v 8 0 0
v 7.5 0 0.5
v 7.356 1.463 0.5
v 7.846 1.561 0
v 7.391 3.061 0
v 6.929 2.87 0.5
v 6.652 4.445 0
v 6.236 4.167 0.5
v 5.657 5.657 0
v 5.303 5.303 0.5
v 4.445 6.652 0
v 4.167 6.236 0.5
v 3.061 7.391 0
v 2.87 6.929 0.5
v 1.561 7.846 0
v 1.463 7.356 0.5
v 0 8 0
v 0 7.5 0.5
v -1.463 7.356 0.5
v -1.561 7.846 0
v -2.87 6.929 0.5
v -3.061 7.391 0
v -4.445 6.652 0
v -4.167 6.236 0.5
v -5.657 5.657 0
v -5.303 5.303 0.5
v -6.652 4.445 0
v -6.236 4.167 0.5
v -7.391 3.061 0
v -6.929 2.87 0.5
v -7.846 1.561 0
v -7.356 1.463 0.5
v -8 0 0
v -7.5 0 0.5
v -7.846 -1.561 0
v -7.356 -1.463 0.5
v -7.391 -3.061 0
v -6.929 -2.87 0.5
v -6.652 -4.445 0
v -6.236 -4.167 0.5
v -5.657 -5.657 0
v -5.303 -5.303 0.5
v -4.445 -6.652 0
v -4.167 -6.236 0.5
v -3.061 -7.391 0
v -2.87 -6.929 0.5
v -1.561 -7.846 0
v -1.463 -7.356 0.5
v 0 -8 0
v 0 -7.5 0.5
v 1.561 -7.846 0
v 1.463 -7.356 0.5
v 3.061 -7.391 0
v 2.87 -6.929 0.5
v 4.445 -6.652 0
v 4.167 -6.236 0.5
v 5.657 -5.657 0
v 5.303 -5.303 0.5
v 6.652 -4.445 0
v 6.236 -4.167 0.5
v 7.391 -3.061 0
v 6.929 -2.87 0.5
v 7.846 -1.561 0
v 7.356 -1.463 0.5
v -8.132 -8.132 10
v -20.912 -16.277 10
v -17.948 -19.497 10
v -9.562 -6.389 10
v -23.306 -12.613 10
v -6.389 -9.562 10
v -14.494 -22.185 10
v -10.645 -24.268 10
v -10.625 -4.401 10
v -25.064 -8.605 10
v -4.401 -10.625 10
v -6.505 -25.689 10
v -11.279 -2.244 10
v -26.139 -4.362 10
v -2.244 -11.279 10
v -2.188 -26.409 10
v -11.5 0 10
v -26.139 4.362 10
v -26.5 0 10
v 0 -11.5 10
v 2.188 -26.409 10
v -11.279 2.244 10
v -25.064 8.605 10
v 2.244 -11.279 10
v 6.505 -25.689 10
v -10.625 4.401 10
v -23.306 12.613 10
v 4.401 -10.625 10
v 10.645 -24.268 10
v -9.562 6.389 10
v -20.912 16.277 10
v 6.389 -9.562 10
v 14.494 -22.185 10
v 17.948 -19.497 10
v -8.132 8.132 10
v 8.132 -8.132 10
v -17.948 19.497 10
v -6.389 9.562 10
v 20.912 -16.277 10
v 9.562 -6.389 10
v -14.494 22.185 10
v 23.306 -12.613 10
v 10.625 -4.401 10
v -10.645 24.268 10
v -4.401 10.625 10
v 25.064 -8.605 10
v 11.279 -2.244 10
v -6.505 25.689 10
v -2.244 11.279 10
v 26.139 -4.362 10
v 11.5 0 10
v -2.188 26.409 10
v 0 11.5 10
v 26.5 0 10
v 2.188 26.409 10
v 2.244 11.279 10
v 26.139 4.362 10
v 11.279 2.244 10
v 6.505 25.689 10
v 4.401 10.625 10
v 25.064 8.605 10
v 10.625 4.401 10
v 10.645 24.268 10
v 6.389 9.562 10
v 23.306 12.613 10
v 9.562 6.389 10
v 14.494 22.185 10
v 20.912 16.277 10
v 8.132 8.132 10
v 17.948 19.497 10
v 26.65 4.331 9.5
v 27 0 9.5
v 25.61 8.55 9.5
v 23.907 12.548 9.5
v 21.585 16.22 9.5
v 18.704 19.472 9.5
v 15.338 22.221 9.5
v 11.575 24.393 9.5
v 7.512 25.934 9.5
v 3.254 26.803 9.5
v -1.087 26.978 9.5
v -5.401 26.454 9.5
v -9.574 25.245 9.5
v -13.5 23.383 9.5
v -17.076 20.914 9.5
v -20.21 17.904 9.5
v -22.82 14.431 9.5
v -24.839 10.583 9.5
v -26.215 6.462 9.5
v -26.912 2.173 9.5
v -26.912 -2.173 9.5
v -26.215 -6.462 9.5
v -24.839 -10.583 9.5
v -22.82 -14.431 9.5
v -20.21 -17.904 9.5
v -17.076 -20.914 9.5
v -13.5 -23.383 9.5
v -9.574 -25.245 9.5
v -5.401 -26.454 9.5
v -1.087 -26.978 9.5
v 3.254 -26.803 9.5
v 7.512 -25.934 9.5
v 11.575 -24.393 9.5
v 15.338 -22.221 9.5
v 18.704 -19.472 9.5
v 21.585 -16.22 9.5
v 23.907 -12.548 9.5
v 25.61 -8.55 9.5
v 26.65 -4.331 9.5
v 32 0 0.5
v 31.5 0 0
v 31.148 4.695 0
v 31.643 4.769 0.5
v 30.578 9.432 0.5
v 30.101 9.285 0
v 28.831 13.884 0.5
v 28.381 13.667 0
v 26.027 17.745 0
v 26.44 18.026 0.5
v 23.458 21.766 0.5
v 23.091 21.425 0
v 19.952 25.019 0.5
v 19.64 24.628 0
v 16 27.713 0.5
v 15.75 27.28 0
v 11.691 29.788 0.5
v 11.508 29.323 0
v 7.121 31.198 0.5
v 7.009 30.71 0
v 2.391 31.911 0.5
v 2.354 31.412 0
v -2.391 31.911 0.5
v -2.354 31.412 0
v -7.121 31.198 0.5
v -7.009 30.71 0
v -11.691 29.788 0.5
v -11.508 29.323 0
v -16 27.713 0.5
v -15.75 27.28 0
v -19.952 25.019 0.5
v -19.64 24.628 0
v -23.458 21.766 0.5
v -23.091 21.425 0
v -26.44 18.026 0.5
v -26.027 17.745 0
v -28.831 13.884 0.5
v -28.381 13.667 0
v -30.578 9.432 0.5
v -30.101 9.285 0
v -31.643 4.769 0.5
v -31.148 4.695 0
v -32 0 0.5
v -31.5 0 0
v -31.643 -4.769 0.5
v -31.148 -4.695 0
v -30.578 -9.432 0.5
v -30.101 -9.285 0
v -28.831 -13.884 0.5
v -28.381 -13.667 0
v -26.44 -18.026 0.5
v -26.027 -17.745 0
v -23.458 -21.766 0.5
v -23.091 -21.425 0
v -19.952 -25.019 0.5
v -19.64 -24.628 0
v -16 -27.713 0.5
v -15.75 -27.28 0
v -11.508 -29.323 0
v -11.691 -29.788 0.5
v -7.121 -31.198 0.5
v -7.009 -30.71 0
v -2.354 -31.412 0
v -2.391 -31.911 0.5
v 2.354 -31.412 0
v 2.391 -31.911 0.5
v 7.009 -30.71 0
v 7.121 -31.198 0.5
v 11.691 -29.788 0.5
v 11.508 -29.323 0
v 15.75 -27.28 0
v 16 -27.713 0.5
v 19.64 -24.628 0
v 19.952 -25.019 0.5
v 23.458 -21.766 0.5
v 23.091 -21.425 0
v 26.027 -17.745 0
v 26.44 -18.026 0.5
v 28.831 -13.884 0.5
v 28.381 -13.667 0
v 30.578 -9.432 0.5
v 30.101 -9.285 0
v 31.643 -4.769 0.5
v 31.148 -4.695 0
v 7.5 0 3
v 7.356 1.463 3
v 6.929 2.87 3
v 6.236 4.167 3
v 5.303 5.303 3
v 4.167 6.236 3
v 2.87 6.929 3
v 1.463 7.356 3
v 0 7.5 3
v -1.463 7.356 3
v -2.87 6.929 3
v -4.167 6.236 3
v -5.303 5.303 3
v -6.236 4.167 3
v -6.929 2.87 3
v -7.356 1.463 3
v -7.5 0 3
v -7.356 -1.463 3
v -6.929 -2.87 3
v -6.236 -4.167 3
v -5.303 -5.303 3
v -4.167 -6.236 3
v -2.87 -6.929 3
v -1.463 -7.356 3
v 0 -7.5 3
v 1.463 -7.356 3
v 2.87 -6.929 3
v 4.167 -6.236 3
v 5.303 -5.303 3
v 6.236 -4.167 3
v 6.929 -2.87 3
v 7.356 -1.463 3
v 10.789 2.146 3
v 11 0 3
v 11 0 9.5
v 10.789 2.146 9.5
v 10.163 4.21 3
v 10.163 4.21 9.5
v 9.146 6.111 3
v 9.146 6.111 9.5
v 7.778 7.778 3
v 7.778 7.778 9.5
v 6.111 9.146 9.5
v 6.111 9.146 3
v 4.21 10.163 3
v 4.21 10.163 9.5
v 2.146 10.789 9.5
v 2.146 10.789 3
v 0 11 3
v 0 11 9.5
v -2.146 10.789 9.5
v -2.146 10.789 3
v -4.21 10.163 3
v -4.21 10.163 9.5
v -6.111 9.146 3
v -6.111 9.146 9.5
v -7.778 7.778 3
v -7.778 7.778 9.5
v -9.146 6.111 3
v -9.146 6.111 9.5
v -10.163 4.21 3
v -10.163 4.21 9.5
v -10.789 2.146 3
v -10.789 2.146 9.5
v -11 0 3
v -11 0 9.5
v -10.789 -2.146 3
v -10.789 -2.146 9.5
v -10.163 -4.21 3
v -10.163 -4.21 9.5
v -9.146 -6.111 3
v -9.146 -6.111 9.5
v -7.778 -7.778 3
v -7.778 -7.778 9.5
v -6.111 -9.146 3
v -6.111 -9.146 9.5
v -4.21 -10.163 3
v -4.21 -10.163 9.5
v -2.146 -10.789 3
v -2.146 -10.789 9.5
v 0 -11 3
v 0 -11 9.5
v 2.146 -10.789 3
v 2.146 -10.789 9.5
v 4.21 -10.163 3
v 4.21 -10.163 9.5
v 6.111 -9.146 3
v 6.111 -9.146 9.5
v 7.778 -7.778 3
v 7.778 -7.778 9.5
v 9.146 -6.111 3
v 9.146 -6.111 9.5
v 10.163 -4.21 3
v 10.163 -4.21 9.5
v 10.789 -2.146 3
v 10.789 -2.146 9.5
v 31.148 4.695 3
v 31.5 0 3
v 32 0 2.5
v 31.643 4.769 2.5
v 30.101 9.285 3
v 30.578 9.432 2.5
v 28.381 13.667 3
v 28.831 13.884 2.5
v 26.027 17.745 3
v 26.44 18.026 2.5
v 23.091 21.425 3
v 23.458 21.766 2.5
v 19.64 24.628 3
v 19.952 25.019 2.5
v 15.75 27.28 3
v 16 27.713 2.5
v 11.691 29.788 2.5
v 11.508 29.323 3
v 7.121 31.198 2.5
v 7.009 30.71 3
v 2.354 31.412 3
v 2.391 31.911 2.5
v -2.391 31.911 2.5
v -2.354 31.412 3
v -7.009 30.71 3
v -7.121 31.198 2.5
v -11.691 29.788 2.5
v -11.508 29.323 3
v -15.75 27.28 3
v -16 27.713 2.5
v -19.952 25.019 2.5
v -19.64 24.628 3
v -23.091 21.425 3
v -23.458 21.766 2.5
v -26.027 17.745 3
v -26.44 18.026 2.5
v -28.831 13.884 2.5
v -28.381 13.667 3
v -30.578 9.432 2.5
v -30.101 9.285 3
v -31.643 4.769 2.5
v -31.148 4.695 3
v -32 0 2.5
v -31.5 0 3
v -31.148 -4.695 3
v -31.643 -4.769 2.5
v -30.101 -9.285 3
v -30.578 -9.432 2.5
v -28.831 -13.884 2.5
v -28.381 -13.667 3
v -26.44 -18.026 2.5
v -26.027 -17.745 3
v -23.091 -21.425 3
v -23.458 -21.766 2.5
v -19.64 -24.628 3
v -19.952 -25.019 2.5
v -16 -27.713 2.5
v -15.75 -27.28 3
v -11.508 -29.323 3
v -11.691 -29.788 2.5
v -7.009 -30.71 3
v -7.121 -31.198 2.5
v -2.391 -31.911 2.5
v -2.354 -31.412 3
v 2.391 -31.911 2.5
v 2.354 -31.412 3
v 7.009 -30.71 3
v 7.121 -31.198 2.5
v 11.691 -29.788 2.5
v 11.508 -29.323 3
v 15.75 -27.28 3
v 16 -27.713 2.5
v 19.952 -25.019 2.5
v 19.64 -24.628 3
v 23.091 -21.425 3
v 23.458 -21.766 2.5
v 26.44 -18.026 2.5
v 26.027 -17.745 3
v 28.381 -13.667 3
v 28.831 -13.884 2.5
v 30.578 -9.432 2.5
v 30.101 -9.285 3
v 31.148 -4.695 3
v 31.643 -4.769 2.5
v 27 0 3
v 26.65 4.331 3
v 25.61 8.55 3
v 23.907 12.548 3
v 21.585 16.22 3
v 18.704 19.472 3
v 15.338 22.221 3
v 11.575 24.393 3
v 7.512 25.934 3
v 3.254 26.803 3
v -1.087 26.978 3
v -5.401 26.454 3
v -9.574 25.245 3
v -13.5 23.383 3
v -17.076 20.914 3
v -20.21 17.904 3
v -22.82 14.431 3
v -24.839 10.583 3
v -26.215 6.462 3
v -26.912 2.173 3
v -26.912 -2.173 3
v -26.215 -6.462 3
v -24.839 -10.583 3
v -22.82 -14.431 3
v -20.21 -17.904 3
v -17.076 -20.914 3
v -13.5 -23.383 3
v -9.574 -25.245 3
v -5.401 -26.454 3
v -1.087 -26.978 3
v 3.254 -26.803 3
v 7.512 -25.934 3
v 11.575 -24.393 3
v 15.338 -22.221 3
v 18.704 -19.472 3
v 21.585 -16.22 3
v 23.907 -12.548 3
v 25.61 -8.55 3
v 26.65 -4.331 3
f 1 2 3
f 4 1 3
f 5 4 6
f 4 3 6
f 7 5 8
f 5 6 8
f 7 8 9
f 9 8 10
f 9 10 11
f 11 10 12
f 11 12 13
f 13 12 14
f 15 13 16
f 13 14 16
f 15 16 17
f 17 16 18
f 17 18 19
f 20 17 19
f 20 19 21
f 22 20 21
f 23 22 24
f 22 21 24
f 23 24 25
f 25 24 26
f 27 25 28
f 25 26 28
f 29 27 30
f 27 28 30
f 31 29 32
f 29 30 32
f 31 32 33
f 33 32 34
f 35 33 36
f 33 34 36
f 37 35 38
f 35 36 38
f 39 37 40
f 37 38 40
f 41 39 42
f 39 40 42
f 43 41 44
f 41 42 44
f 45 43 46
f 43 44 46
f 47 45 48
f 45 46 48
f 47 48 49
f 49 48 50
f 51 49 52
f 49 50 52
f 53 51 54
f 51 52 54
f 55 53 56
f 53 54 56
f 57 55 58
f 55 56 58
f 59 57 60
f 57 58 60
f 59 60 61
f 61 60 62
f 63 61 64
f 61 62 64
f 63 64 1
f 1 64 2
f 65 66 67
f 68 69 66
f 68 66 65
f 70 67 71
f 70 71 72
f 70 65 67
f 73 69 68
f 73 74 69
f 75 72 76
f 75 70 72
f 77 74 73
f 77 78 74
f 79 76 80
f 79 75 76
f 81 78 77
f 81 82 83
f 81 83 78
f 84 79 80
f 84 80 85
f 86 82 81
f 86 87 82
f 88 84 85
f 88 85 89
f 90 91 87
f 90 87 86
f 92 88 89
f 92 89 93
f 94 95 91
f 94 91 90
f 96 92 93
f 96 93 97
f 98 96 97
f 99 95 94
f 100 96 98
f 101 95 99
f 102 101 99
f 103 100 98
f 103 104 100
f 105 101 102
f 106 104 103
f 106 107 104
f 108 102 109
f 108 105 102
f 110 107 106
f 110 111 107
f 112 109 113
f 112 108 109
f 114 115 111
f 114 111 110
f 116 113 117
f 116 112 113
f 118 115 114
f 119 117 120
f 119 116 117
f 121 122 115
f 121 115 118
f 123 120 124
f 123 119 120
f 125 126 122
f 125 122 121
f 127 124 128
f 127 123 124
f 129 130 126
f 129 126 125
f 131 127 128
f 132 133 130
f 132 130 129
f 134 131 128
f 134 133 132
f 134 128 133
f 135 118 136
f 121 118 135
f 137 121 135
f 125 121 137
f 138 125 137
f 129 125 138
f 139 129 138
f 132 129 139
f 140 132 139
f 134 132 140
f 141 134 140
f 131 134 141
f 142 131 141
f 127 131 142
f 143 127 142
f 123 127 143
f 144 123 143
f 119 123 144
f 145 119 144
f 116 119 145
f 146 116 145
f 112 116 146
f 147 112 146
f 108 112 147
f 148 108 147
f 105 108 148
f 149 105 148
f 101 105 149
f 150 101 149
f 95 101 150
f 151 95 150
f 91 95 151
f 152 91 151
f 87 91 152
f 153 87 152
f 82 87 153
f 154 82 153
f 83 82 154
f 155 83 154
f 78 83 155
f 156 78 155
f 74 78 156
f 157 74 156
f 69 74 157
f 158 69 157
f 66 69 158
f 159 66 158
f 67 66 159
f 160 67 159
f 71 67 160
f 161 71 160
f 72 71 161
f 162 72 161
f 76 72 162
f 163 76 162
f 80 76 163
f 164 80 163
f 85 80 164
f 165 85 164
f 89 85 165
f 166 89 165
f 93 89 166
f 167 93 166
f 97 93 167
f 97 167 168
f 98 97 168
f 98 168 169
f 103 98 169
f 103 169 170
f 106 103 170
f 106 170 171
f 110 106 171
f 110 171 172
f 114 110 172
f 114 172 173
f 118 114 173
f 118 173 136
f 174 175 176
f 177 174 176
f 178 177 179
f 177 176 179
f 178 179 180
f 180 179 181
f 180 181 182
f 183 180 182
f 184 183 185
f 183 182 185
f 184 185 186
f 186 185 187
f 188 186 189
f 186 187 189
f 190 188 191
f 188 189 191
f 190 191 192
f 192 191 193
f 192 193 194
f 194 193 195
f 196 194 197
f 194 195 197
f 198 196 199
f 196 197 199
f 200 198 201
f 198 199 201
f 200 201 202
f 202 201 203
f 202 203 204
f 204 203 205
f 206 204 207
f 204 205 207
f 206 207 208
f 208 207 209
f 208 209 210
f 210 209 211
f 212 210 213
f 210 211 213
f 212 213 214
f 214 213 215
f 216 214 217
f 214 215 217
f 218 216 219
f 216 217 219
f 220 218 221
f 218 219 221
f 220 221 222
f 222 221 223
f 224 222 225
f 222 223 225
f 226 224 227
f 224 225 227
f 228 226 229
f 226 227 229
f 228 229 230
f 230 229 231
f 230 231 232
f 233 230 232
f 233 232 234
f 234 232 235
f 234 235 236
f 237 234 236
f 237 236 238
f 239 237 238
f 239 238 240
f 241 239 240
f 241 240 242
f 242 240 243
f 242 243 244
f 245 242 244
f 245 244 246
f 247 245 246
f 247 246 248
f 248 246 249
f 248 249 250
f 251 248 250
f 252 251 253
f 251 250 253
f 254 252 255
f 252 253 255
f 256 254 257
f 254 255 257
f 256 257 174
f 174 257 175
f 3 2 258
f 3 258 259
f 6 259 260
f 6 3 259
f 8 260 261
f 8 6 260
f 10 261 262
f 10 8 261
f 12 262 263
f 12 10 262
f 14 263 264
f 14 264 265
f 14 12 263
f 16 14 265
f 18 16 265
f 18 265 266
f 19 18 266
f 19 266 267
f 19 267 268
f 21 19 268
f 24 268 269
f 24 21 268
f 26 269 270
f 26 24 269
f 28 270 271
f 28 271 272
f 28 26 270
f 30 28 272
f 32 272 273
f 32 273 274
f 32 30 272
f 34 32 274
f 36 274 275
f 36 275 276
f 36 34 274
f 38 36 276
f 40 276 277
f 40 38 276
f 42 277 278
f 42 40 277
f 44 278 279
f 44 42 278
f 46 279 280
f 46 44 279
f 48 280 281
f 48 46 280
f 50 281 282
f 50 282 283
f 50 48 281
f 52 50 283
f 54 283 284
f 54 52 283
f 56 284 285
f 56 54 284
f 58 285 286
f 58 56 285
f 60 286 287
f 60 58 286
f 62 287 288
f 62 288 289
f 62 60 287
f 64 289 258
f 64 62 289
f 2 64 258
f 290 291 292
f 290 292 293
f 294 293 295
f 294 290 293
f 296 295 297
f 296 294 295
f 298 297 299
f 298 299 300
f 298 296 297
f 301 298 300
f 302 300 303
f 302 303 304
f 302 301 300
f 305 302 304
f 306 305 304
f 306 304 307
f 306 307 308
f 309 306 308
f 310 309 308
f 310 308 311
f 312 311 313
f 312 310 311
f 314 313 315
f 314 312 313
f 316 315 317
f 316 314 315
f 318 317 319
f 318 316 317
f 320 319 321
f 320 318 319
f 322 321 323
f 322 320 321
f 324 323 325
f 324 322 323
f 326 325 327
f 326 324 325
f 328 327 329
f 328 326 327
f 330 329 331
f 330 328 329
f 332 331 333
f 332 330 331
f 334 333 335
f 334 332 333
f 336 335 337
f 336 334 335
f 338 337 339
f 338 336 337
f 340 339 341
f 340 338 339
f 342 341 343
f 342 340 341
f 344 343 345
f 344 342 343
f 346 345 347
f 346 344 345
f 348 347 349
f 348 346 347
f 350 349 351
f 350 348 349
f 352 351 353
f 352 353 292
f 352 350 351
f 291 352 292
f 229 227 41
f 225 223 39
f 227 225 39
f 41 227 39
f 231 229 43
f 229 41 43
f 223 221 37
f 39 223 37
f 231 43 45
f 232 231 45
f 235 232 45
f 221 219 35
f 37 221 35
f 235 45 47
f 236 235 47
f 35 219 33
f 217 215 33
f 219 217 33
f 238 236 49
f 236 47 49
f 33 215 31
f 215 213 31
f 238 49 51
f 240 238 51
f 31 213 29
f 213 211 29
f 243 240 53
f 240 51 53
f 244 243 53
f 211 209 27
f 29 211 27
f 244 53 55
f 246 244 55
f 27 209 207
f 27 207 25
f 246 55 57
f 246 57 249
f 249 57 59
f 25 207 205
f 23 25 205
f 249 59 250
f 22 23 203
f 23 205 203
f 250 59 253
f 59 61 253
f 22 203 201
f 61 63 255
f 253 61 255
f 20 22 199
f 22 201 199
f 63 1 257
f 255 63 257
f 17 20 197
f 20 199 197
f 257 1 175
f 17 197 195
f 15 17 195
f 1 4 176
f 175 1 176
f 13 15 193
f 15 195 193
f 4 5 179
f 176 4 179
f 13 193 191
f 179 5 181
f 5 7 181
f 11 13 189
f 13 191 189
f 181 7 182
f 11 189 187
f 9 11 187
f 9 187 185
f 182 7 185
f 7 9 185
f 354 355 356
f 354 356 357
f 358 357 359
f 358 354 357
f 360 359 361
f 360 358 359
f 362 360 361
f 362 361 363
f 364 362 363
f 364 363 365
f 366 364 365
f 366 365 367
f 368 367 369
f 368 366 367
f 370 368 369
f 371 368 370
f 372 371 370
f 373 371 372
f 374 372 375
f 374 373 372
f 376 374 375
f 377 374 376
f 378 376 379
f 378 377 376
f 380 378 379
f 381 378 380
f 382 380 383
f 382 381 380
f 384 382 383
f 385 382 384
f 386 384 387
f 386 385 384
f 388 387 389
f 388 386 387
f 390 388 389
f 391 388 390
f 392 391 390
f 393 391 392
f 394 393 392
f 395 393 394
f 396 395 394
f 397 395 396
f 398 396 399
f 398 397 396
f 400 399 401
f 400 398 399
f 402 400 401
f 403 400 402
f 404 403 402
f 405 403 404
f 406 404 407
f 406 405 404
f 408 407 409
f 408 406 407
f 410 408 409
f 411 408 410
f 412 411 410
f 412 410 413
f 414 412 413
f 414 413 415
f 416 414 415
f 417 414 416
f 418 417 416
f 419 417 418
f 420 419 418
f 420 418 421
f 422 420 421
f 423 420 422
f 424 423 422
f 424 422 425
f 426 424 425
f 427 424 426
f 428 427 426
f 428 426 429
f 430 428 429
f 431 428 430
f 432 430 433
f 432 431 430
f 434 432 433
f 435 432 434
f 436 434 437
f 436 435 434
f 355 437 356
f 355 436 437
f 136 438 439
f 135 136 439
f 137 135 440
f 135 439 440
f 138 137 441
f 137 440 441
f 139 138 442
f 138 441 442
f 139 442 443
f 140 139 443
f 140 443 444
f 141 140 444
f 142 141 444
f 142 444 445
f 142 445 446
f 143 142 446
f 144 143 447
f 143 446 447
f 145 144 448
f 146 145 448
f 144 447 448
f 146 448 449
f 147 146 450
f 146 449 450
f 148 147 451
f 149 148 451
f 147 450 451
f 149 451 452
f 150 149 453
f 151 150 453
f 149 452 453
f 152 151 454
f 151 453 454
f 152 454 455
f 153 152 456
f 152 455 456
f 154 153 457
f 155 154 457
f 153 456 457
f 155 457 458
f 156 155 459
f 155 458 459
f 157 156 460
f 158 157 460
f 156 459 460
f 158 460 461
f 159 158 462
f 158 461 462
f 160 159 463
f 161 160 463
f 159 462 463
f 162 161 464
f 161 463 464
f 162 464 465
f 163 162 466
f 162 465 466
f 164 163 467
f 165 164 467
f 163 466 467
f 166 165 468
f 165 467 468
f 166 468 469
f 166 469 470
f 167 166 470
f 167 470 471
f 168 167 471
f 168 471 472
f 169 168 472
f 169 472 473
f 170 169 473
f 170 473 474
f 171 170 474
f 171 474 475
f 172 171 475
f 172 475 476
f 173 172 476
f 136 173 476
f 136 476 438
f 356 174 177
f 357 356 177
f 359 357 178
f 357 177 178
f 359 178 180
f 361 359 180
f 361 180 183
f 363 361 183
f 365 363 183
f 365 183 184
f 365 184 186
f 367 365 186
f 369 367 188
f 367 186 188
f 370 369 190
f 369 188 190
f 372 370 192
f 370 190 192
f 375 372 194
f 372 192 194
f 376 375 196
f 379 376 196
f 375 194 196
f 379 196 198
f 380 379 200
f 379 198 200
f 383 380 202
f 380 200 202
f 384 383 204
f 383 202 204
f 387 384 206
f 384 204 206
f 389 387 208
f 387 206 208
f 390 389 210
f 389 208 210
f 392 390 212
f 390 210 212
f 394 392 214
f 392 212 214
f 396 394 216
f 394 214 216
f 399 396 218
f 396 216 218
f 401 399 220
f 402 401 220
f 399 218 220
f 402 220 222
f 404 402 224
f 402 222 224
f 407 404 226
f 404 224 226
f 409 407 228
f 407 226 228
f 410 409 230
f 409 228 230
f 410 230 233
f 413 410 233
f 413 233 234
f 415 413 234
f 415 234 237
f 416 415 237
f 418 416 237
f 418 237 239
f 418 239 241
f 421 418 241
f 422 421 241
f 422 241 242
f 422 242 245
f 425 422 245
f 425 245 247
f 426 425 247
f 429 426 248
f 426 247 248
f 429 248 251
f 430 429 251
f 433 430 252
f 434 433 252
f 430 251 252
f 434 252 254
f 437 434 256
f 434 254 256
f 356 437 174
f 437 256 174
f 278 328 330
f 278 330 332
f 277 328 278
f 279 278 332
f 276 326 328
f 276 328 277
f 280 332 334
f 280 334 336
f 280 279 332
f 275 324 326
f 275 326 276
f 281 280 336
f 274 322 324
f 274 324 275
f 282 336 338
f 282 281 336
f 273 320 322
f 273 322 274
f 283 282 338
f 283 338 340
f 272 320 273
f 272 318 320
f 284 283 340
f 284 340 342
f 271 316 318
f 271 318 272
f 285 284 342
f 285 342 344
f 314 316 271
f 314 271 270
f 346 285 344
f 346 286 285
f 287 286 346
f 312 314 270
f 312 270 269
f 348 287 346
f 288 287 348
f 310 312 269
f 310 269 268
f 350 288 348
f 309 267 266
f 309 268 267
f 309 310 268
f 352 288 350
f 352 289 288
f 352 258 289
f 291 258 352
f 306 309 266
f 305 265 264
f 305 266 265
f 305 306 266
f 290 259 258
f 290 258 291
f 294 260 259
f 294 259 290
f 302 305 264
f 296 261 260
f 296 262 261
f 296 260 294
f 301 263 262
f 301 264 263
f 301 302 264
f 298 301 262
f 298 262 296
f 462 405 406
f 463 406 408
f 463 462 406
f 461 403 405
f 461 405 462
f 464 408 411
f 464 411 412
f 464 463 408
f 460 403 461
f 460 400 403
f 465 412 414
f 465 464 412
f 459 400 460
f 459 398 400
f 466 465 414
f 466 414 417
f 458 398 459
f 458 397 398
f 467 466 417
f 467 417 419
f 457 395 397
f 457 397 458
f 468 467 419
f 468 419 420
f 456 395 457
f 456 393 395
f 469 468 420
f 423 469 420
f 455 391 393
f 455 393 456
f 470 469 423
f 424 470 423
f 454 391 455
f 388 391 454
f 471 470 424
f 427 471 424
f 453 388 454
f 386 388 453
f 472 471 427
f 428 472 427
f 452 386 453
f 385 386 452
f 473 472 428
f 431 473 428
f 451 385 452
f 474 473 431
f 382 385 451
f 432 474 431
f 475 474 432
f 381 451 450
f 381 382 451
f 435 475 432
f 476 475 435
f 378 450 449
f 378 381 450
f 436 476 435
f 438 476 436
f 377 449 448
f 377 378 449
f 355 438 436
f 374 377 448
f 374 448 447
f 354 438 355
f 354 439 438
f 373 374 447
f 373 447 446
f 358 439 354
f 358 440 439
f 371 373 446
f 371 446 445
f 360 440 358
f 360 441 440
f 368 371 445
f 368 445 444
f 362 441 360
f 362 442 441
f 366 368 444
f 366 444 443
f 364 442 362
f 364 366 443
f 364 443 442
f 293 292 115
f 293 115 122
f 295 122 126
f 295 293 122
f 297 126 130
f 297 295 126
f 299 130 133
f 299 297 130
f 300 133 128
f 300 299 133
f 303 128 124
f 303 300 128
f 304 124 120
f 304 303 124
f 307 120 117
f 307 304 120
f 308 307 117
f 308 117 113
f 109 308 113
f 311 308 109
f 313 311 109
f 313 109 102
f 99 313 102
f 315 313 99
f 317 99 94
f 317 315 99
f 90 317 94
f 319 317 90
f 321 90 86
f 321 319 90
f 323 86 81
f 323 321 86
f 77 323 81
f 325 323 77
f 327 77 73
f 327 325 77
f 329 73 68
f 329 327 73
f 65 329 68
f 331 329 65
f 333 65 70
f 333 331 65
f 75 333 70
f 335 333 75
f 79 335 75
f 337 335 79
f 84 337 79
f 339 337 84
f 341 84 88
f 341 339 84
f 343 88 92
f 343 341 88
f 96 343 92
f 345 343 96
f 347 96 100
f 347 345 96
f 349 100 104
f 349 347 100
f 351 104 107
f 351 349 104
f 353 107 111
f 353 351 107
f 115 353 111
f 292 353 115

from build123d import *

# Parameters (mm, degrees)
F0_R     = 32
F0_R_2   = 7.5
F1_DEPTH = 3
F2_R     = 27
F2_R_2   = 11
F3_DEPTH = 7
F4_SIZE  = 0.5


with BuildPart() as f1:
    # F0 (on Top) → F1 (new body)
    with BuildSketch(Plane.XY):
        Circle(F0_R)
        Circle(F0_R_2, mode=Mode.SUBTRACT)
    extrude(amount=F1_DEPTH)

    # F2 (on face) → F3 (join)
    with BuildSketch(Plane.XY.offset(3)):
        Circle(F2_R)
        Circle(F2_R_2, mode=Mode.SUBTRACT)
    extrude(amount=F3_DEPTH)

    # F4
    f4_edges = [f1.edges().sort_by_distance(p)[0] for p in [
        (-27, 0, 10),
        (-32, 0, 3),
        (-11, 0, 10),
        (-32, 0, 0),
        (-7.5, 0, 0),
    ]]
    chamfer(f4_edges, length=F4_SIZE)


solid = f1.part
